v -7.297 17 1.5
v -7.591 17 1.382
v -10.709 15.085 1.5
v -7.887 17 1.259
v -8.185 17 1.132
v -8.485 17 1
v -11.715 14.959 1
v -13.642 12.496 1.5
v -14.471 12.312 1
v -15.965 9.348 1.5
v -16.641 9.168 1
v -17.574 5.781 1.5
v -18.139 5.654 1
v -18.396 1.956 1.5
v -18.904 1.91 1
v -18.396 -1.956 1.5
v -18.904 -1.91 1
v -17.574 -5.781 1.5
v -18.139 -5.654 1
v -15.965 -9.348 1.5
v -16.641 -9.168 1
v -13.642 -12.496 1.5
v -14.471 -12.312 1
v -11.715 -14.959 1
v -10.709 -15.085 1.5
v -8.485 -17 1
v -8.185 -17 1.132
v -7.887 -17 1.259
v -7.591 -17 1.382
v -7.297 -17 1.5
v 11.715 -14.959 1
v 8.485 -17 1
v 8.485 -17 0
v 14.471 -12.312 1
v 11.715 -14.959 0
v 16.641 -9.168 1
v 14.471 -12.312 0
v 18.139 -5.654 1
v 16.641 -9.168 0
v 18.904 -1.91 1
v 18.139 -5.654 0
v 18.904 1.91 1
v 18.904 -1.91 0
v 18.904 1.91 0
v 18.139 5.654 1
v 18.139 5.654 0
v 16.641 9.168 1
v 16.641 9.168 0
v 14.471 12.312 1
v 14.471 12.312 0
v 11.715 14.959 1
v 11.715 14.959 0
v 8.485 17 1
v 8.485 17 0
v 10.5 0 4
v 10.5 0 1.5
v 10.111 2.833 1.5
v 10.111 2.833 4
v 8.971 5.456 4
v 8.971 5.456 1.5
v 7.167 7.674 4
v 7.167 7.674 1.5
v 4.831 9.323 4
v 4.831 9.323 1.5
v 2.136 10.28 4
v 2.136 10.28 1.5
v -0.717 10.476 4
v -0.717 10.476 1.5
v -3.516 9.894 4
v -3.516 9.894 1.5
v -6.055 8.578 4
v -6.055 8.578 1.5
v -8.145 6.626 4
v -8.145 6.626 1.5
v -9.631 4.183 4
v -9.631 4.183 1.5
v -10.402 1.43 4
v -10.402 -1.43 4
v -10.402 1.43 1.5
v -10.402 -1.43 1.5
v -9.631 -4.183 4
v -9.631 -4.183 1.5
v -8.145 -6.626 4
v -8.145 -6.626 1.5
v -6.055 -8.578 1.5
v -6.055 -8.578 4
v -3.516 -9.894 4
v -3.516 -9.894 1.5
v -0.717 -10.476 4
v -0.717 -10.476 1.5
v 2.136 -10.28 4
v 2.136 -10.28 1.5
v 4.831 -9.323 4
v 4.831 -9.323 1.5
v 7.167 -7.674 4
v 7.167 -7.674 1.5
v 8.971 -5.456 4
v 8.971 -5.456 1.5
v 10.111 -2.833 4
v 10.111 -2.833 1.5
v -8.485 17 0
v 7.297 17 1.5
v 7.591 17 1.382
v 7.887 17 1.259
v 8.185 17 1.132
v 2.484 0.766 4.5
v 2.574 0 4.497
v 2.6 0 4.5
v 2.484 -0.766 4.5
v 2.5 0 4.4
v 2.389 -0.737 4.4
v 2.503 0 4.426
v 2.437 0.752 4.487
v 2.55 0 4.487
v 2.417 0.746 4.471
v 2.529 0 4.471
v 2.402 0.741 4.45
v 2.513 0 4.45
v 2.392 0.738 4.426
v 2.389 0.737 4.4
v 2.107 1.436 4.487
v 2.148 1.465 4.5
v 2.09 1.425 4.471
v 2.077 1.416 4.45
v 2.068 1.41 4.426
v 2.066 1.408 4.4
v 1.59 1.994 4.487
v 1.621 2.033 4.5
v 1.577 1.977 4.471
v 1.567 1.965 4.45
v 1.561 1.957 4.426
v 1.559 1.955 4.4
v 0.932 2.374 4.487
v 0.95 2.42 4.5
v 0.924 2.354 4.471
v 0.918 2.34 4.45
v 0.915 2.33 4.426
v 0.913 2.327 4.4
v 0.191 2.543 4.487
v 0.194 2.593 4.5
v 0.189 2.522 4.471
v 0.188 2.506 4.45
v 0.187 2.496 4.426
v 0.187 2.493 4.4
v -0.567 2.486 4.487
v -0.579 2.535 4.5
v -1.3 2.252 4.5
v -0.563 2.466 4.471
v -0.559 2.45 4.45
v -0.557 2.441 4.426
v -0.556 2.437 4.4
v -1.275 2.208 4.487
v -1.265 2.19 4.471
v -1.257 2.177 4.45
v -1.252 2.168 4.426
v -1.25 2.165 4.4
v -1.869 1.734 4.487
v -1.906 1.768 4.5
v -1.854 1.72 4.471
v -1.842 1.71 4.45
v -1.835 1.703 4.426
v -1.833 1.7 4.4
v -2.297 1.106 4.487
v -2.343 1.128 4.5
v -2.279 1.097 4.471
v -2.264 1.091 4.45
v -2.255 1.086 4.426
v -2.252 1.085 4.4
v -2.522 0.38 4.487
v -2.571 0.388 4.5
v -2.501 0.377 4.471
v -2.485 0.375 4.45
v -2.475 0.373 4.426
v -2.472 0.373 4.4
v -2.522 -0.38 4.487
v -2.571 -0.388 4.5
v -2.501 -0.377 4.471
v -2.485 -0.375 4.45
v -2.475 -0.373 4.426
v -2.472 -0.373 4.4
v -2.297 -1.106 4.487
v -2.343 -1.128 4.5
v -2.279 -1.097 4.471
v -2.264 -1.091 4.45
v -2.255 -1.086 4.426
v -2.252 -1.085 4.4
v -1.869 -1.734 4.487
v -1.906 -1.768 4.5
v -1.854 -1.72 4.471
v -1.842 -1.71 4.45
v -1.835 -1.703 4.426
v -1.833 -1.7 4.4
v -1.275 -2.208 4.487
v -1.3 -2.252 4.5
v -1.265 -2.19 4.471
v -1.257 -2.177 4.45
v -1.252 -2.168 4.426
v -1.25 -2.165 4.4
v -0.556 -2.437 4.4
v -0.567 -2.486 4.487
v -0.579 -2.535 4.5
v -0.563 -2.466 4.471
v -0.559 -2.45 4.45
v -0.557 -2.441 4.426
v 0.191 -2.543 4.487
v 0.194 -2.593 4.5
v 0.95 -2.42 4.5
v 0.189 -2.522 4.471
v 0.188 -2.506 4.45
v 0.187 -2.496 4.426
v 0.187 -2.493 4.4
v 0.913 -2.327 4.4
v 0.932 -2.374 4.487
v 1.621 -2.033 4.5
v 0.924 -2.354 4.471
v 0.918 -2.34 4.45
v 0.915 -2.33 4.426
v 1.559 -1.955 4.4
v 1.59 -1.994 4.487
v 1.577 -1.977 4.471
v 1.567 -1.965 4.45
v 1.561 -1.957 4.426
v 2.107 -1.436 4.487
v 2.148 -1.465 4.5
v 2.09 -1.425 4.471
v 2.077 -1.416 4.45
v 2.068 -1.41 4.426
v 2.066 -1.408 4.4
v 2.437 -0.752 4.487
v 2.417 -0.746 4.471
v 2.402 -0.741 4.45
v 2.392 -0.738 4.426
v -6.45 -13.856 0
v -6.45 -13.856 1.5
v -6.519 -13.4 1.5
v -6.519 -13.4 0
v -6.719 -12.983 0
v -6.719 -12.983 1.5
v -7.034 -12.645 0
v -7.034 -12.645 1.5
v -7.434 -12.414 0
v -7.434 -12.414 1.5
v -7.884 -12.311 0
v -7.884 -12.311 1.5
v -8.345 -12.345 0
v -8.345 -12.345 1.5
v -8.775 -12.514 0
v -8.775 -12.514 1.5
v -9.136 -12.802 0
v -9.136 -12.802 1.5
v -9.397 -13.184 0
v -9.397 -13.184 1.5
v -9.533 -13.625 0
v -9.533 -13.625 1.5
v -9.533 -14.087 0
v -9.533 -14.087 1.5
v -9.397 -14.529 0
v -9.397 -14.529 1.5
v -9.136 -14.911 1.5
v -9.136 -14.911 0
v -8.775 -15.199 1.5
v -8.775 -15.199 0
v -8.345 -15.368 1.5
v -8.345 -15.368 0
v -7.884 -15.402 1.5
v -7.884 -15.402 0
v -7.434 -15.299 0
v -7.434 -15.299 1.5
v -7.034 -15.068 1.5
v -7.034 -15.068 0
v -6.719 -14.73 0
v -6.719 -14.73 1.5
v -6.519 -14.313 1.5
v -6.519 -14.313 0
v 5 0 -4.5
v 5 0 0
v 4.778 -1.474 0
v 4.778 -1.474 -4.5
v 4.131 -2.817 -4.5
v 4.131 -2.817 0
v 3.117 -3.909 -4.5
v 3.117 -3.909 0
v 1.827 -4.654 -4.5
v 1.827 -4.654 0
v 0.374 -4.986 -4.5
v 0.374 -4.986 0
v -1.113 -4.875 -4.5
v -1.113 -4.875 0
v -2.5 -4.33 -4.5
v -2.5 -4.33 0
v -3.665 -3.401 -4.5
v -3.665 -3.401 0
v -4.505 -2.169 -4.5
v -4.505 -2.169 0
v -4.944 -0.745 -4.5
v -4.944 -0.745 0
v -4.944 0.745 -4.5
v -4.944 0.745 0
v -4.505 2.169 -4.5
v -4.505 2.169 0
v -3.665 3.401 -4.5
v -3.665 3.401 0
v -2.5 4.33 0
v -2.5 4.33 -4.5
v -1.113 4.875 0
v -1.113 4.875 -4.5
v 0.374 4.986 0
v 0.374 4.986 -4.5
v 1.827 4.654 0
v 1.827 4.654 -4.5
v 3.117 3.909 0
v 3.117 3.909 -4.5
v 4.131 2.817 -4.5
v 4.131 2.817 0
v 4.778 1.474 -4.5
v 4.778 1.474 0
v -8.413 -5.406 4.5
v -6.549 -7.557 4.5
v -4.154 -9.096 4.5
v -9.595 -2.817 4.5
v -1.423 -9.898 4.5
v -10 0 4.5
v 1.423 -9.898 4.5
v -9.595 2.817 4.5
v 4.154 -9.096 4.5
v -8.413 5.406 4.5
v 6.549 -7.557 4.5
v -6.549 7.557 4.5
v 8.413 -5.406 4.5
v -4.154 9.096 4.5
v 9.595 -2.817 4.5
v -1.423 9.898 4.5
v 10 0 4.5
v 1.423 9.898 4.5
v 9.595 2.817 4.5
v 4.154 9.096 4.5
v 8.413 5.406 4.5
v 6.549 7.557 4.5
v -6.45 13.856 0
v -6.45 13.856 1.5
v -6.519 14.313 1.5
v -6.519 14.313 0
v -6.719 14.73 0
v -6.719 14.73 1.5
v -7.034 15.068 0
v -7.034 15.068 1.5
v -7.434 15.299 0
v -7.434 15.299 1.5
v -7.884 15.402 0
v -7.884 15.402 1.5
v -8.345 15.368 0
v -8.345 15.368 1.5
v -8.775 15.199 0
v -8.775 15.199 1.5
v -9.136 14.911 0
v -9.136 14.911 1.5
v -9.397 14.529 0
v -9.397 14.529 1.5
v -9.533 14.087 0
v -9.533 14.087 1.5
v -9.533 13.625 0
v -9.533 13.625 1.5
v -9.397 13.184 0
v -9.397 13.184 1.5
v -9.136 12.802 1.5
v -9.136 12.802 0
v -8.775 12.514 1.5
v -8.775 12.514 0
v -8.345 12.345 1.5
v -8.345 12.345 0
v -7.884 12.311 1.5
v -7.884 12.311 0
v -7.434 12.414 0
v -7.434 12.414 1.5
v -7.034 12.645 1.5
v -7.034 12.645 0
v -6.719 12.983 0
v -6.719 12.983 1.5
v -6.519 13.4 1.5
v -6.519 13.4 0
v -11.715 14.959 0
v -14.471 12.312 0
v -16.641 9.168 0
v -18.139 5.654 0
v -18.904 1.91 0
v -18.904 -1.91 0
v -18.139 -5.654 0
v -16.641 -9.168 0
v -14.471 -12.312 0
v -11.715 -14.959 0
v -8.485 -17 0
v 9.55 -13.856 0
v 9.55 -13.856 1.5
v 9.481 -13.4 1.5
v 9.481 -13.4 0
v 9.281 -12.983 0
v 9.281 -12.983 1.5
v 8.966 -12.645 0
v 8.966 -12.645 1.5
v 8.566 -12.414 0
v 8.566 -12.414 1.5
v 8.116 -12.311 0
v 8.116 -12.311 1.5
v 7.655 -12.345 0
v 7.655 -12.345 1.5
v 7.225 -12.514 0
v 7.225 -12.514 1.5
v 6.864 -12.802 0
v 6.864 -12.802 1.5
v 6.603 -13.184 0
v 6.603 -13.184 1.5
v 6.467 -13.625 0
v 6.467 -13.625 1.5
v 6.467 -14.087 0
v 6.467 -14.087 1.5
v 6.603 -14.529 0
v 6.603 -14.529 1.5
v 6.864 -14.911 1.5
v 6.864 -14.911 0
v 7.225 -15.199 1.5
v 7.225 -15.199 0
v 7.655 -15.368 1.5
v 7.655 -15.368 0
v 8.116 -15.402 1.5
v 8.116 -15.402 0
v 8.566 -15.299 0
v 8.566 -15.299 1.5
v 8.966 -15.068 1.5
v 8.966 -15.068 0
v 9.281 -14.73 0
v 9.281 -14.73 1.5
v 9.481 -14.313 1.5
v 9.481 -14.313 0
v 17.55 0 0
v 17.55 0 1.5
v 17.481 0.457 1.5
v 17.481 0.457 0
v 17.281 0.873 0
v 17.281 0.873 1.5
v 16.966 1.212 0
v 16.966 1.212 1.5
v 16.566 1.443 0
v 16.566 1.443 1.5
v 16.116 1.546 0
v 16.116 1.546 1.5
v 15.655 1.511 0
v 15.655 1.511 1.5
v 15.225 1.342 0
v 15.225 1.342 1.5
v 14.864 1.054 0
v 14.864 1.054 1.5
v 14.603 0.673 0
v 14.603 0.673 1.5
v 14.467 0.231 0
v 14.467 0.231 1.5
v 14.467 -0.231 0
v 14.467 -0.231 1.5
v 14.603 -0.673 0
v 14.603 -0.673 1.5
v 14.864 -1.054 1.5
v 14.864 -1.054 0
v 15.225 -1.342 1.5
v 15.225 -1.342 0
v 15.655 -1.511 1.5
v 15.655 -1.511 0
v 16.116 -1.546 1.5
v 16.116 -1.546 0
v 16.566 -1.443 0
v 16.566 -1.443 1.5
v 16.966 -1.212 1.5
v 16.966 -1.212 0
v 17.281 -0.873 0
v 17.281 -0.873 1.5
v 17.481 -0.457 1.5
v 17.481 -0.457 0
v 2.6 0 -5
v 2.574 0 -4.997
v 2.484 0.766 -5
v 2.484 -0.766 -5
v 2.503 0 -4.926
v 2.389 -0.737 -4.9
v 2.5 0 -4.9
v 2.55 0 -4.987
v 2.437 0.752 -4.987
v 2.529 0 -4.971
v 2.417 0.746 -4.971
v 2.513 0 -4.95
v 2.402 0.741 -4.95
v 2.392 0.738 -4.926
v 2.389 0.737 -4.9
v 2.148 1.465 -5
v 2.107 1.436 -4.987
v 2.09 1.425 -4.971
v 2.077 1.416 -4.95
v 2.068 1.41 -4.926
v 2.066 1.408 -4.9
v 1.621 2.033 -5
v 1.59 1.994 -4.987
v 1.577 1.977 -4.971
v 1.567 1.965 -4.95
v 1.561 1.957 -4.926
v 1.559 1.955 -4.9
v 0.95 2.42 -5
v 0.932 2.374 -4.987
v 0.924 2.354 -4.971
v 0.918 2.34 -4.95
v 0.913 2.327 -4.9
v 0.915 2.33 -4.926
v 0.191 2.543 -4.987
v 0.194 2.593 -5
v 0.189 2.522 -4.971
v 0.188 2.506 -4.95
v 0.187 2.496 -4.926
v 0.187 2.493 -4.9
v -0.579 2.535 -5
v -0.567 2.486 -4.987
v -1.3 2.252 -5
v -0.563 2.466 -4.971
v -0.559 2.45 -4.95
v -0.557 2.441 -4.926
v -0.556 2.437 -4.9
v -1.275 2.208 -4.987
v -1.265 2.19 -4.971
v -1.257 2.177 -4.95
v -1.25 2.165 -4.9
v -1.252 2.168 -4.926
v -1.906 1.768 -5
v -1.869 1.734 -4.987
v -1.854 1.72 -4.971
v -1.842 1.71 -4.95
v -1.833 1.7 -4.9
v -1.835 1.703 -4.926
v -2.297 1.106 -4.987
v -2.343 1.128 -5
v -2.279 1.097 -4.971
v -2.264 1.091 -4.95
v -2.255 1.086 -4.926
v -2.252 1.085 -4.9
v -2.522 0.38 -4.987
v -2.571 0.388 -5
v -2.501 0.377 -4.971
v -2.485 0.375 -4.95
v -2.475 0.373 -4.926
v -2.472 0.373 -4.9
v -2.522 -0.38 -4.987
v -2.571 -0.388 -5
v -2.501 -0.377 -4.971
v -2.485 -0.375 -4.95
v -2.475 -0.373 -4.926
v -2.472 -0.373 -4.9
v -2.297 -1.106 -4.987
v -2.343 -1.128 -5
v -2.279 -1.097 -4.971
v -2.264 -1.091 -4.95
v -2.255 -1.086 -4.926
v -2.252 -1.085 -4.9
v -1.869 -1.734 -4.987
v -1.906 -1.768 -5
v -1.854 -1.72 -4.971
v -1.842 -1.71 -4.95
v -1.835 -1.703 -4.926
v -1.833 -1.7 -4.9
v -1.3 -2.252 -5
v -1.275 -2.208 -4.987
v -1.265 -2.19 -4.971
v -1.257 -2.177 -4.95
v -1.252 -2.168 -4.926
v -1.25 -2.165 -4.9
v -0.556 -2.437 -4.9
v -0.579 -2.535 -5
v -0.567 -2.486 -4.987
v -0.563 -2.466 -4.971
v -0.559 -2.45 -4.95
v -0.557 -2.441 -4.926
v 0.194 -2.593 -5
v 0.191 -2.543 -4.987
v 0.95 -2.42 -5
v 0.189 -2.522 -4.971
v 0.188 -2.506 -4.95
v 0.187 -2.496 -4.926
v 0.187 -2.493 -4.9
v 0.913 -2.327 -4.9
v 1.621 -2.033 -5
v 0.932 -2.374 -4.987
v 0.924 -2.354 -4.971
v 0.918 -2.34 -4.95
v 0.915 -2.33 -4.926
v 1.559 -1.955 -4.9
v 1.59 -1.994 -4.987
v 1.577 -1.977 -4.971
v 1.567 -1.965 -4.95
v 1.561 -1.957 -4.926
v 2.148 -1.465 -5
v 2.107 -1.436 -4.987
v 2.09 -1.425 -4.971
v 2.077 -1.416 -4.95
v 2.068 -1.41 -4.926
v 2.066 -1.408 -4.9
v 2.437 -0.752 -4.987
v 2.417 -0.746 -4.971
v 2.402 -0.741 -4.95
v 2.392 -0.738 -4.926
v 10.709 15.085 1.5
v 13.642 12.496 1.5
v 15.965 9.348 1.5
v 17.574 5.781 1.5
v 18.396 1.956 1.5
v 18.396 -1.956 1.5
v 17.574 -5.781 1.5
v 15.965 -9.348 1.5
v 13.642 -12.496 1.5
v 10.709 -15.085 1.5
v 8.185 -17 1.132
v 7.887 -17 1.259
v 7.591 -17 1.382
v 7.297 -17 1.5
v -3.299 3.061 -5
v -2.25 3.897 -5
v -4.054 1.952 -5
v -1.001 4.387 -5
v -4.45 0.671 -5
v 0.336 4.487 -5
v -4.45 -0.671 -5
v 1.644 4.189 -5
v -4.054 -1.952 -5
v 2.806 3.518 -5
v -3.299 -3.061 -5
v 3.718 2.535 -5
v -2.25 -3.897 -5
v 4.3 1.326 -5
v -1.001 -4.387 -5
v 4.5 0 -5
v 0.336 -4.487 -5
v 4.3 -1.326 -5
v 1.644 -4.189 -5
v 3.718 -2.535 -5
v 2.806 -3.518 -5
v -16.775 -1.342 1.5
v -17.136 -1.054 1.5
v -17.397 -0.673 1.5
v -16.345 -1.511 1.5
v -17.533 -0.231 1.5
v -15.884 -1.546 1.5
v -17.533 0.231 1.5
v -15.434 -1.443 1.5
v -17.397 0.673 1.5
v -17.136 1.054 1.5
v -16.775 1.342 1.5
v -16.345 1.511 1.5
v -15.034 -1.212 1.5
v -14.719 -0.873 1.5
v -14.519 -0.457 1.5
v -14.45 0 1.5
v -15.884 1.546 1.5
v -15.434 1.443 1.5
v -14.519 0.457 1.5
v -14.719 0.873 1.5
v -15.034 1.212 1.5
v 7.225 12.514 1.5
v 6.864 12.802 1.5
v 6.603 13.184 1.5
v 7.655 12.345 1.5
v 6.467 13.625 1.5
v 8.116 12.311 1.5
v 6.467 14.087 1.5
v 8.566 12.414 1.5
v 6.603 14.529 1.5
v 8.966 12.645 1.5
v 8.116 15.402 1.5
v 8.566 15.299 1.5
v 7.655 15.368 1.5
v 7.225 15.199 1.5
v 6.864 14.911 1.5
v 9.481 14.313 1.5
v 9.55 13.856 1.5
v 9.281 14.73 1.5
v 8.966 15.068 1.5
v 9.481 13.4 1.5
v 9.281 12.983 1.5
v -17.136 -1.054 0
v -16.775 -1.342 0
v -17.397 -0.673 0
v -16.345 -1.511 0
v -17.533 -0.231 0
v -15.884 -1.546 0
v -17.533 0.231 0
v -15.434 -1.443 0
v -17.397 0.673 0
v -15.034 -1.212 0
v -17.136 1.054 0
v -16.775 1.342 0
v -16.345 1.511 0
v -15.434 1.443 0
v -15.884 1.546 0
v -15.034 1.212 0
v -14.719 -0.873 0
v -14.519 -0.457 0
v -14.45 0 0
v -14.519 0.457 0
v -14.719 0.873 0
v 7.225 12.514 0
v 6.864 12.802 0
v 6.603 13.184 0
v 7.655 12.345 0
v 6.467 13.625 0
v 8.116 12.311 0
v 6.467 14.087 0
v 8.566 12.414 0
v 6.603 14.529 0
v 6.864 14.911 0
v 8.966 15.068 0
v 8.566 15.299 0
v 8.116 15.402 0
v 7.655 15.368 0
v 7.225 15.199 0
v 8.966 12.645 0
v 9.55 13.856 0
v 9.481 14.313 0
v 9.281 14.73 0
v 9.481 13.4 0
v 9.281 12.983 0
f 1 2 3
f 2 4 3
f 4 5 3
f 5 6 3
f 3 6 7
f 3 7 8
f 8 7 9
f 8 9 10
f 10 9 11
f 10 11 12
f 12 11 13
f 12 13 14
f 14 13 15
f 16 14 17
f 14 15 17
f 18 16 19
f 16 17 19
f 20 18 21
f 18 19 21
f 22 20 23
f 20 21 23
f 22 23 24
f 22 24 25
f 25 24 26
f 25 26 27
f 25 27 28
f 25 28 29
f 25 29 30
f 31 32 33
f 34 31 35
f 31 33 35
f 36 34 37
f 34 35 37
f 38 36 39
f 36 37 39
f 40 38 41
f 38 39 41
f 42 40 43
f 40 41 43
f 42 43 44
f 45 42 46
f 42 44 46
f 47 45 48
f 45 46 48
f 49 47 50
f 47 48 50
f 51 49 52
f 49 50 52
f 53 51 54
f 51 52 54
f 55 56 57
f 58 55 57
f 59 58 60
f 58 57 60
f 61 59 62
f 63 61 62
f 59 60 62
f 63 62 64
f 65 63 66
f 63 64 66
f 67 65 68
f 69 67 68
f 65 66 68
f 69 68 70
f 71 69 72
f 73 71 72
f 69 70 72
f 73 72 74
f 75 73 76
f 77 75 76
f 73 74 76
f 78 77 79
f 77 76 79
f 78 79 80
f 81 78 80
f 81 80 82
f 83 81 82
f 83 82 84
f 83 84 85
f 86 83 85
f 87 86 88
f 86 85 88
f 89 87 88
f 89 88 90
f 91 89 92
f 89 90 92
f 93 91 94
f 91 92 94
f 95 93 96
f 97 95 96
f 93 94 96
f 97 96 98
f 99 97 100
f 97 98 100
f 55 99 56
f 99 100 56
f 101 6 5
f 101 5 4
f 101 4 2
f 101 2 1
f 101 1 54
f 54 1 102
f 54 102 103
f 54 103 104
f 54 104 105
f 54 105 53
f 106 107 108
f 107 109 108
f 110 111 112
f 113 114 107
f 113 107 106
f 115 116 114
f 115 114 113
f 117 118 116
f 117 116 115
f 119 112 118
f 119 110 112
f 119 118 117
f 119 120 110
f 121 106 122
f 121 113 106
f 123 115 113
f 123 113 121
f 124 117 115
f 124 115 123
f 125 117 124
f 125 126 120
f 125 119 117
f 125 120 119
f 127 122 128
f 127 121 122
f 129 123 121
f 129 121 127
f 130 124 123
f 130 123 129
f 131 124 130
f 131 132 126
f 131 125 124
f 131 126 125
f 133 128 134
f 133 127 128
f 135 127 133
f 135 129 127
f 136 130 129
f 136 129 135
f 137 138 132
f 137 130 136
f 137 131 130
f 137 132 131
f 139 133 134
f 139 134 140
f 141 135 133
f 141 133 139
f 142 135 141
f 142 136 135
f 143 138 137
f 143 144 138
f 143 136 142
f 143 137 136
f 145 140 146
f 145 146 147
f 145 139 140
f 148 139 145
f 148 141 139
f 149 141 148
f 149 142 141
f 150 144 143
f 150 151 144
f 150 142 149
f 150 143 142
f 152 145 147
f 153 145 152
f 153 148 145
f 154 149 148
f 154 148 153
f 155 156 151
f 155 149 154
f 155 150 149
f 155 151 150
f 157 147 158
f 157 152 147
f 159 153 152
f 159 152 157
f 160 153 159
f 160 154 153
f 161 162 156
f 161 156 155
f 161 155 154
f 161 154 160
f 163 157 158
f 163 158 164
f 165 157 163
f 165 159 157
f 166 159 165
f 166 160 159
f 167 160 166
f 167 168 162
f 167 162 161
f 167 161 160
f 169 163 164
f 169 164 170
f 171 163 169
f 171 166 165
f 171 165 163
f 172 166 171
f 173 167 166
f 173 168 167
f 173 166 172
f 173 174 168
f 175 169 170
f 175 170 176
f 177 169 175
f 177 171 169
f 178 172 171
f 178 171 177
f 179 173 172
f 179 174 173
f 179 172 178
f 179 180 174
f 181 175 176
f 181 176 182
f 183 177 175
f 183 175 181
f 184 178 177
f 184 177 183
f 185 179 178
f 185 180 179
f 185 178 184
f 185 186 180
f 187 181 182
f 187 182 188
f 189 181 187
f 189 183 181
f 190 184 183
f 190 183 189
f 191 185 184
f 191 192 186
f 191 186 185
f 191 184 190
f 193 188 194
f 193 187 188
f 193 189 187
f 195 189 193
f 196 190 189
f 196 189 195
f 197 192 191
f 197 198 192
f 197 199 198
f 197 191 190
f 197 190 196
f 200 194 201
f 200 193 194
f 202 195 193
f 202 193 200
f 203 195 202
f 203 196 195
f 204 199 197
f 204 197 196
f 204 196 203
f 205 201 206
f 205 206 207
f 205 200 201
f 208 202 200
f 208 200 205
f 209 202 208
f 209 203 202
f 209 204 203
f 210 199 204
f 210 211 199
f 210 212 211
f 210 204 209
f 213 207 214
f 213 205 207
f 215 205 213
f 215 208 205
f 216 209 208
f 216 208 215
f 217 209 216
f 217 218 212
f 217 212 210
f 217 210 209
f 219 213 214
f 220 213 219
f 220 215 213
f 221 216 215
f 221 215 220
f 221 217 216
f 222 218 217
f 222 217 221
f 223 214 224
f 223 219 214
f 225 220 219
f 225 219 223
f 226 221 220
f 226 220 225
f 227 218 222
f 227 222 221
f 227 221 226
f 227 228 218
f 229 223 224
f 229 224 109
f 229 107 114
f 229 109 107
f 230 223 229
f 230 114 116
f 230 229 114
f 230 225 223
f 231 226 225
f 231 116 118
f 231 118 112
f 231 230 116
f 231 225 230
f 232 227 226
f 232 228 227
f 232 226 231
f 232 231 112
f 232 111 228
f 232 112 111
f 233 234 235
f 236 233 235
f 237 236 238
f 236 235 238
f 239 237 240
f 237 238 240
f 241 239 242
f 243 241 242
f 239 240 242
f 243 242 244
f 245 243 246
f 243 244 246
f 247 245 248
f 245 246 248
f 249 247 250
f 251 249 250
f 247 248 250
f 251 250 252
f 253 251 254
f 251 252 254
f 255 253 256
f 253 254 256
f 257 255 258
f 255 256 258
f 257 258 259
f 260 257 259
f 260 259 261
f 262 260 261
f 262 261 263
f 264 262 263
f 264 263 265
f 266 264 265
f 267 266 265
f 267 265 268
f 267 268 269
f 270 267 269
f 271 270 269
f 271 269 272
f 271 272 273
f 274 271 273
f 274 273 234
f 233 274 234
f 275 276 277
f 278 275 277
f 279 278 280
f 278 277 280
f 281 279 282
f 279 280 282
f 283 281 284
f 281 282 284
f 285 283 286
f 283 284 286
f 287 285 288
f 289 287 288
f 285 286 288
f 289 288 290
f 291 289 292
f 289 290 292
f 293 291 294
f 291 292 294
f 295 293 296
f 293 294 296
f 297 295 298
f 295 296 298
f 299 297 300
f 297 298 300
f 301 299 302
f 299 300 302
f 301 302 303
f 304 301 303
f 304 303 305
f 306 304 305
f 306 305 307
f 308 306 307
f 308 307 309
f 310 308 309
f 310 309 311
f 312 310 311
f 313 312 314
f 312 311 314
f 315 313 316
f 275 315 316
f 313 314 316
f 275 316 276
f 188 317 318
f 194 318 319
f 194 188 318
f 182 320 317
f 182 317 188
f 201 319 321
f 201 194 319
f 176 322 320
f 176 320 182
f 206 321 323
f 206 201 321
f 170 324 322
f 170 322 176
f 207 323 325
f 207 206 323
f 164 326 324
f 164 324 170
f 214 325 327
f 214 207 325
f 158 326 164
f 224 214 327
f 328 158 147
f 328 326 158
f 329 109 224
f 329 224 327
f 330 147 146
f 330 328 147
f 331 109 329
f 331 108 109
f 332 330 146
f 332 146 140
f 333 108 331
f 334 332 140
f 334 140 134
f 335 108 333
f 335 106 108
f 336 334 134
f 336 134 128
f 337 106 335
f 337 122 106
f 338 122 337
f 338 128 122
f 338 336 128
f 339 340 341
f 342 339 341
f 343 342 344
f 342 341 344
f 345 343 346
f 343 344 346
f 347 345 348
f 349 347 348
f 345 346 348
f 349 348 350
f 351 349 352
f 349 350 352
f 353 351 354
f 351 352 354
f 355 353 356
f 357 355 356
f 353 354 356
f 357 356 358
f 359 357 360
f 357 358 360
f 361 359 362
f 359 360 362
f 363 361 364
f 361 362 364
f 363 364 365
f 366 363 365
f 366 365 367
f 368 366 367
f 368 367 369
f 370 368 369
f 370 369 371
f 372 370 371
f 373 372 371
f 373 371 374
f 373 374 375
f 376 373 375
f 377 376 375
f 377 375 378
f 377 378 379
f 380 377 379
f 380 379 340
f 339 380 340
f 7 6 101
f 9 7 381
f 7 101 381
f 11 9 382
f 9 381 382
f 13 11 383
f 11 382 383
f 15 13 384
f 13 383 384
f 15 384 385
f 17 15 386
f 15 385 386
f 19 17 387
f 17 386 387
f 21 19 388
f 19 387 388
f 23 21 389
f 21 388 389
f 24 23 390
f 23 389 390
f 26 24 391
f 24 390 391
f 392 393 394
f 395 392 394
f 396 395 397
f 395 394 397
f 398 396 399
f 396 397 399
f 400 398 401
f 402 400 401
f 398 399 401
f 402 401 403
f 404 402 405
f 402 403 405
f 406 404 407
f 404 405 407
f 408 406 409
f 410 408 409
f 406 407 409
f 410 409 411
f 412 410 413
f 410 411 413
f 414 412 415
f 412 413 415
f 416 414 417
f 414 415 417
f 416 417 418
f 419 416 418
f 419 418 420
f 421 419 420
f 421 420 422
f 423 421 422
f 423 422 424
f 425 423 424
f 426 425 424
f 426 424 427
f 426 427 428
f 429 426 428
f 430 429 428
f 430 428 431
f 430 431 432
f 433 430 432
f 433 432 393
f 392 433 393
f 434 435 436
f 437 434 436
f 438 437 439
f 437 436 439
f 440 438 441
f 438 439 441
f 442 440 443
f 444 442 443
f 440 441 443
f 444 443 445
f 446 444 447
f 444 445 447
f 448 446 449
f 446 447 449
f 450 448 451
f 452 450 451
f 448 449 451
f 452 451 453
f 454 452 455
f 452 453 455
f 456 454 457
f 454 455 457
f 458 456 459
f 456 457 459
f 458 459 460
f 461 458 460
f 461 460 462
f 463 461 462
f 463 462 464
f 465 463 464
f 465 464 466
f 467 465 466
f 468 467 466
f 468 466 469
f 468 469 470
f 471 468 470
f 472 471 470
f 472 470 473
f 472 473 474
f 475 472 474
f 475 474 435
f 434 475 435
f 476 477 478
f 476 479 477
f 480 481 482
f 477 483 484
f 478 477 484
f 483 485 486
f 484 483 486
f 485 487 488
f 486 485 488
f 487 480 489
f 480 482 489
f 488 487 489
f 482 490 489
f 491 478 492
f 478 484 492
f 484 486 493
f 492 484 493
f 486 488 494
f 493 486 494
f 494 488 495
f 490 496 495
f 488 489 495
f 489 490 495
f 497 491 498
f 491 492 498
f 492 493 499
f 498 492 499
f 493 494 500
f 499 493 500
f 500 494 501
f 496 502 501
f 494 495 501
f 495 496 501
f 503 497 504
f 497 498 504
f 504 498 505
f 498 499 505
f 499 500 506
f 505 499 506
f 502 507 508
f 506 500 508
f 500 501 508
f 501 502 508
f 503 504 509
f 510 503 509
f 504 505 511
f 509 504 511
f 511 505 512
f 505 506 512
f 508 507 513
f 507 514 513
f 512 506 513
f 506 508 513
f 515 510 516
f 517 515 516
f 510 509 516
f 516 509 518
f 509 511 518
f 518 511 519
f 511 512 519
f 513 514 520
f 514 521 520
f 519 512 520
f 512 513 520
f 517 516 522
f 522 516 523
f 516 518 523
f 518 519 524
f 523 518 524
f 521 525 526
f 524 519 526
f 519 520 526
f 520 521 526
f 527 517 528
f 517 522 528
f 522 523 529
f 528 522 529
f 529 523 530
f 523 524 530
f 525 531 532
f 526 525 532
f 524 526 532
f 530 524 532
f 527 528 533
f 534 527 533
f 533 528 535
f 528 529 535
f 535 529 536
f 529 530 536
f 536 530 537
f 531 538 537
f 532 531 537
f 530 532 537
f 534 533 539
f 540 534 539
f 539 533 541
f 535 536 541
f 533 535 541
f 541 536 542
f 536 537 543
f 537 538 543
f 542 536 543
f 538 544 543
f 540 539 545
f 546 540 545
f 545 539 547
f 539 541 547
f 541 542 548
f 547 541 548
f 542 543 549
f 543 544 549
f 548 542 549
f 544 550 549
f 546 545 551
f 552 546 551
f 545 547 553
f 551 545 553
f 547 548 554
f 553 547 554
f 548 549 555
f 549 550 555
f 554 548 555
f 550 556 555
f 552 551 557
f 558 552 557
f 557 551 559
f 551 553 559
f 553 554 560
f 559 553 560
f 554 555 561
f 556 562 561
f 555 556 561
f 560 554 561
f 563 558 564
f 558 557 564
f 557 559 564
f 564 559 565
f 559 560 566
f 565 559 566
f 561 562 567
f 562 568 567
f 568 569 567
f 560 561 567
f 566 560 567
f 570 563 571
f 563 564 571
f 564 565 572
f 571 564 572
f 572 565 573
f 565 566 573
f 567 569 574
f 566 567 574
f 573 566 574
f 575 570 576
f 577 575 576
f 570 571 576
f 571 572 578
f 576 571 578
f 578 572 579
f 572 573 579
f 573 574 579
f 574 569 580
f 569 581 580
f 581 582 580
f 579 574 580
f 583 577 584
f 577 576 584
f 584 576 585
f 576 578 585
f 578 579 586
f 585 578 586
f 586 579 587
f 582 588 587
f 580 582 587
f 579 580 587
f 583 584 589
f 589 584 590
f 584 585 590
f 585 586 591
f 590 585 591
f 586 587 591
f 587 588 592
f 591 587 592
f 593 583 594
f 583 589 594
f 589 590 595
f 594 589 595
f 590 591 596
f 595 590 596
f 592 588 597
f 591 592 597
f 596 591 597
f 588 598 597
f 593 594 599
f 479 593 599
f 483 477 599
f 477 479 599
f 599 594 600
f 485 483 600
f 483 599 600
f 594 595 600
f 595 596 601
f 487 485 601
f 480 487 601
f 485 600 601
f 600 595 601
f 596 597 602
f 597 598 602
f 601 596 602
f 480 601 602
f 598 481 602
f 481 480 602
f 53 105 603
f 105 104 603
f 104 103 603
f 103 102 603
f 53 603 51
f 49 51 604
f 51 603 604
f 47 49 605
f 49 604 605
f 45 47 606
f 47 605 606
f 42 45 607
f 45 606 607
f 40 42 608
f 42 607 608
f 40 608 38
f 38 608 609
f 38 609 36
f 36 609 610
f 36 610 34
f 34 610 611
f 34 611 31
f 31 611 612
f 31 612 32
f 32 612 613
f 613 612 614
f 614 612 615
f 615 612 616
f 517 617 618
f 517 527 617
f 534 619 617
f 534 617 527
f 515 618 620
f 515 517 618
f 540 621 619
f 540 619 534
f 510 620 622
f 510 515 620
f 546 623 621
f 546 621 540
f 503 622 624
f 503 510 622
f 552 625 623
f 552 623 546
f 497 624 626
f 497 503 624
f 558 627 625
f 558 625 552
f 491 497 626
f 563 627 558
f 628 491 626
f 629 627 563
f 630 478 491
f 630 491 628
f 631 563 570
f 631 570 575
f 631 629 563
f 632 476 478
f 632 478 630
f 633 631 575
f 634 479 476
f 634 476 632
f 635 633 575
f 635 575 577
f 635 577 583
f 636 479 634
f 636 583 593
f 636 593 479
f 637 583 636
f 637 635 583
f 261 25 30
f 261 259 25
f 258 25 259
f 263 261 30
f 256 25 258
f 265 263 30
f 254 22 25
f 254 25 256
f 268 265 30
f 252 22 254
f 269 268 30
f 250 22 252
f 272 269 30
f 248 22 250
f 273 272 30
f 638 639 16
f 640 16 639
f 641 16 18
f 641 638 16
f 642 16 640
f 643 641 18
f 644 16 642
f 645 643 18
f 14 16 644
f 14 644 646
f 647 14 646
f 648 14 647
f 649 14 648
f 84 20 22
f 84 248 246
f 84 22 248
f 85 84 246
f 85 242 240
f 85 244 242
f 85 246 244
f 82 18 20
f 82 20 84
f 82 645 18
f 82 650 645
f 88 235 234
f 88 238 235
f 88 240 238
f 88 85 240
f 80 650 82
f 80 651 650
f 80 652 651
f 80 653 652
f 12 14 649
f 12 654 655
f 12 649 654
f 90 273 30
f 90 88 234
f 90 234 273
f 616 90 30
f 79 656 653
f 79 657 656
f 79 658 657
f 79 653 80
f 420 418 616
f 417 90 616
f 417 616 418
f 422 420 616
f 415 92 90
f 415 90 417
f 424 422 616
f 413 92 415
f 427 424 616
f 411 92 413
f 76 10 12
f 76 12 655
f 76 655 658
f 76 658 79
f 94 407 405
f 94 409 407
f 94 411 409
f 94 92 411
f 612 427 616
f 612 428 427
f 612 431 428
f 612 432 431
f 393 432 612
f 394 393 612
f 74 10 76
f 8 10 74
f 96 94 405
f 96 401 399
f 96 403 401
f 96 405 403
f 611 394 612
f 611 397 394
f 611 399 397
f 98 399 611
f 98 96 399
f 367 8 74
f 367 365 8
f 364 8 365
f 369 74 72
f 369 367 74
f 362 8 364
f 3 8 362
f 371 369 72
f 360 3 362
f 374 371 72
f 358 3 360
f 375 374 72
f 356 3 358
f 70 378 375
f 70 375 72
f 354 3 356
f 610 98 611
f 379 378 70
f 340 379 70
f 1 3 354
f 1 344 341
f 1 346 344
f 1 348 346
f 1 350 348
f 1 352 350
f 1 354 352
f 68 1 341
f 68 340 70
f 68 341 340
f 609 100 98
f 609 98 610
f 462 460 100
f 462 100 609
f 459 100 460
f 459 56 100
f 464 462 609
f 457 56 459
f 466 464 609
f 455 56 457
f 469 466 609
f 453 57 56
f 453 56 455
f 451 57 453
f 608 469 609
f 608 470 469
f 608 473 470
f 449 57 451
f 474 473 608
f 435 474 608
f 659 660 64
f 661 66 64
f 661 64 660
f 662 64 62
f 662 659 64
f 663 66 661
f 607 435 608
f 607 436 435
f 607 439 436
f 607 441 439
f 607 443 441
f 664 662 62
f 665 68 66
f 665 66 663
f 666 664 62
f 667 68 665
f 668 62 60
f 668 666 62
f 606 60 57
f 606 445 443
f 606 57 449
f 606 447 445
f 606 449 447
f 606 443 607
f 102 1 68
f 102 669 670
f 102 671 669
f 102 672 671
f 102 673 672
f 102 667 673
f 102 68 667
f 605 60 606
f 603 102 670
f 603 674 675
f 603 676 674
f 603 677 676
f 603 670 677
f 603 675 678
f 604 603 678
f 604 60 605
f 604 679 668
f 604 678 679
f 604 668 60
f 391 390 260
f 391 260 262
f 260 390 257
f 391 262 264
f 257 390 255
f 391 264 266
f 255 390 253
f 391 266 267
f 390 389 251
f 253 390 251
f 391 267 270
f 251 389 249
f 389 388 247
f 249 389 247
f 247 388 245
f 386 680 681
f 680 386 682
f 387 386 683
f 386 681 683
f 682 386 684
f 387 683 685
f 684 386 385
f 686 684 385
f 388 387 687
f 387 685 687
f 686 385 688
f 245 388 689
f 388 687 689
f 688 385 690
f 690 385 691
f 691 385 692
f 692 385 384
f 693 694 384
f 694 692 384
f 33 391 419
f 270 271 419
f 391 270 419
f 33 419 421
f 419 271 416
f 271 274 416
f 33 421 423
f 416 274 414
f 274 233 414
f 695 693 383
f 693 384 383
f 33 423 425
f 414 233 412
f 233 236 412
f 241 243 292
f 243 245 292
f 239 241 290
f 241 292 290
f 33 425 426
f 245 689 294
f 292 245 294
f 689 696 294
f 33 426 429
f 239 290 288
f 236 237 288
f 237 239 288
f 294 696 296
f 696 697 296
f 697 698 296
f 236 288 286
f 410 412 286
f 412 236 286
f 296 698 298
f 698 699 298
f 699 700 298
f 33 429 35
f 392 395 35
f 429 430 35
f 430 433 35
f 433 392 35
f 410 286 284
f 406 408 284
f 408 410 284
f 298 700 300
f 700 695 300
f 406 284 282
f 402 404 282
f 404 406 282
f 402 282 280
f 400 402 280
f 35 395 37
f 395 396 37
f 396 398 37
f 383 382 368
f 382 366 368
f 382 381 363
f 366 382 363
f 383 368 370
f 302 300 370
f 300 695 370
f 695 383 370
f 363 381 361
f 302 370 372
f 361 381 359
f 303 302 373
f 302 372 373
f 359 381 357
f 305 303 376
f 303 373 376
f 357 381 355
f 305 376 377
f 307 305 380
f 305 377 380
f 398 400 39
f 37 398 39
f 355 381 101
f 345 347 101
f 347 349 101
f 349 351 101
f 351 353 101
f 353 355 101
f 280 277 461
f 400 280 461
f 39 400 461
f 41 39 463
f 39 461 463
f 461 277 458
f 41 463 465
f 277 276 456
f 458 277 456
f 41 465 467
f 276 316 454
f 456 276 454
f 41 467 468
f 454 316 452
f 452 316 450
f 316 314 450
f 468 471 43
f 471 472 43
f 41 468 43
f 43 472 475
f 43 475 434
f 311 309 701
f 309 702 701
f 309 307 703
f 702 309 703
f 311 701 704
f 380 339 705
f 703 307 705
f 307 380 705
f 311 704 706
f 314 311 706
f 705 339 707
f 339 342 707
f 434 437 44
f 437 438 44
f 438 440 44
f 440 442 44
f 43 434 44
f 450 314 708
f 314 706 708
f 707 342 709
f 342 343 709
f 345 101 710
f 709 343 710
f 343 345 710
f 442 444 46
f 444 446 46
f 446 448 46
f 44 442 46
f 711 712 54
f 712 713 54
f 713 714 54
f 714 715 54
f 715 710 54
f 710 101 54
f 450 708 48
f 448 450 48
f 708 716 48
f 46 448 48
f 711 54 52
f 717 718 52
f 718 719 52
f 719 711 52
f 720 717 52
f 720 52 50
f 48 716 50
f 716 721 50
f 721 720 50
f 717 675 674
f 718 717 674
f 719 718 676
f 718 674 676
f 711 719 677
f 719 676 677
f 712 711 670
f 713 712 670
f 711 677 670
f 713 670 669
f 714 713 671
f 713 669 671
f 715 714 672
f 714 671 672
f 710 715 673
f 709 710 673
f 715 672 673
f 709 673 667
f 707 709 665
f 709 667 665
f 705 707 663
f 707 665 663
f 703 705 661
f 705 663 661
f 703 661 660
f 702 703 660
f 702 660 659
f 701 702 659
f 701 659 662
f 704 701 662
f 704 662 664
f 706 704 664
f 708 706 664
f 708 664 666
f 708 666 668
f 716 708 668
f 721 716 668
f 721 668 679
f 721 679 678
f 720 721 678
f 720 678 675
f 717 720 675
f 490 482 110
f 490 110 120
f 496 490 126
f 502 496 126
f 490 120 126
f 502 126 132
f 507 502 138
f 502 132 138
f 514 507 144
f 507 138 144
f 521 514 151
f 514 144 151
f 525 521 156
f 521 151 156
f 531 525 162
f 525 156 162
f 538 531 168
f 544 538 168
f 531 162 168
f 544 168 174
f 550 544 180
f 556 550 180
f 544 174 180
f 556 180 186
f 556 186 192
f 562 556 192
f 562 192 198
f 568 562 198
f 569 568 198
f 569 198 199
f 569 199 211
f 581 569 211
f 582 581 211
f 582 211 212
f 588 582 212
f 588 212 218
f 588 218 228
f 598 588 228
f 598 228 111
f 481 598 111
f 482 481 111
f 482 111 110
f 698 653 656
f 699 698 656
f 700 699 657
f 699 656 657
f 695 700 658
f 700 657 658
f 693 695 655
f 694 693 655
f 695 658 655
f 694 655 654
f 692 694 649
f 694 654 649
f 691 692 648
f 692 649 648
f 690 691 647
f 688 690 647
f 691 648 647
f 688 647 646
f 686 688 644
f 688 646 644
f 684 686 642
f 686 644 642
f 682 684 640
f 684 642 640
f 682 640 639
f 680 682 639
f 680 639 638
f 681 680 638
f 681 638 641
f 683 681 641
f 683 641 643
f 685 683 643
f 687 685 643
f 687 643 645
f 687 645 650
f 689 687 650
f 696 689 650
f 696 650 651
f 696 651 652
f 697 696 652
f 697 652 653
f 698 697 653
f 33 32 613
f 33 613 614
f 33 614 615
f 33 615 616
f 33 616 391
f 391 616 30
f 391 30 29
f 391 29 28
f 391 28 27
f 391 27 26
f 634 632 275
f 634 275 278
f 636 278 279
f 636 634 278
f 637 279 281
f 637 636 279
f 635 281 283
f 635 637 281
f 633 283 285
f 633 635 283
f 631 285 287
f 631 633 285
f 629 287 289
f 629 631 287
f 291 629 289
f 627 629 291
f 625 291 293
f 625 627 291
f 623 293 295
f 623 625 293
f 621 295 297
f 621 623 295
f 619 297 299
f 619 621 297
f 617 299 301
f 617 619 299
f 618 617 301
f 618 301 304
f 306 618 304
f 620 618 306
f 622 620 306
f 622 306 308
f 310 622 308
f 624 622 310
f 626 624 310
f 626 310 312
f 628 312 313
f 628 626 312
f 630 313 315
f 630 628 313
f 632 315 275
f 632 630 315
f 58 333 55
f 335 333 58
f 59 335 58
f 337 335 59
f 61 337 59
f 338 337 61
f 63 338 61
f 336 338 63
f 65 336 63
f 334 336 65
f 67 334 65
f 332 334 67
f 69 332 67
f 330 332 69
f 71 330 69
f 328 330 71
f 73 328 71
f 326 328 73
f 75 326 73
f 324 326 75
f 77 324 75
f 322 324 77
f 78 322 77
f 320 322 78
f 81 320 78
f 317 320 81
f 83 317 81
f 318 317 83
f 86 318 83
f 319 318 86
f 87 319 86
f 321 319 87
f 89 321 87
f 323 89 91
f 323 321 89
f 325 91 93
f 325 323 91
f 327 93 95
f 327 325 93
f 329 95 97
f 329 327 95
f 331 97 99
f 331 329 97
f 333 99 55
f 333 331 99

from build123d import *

# Parameters (mm, degrees)
SKETCH1_R           = 19
BOSS_EXTRUDE2_DEPTH = 1.5
SKETCH2_R           = 1.55
CUT_EXTRUDE1_DEPTH  = 6.5
SKETCH3_R           = 10.5
BOSS_EXTRUDE3_DEPTH = 3
SKETCH4_R           = 5
BOSS_EXTRUDE4_DEPTH = 5
SKETCH5_R           = 2.5
CUT_EXTRUDE2_DEPTH  = 28.207535721
CHAMFER1_SIZE       = 0.5
FILLET1_R           = 0.1


with BuildPart() as part:
    # Sketch1 → Boss-Extrude2 (new body)
    with BuildSketch(Plane.XY):
        Circle(SKETCH1_R)
    extrude(amount=BOSS_EXTRUDE2_DEPTH)

    # Sketch2 → Cut-Extrude1 (cut)
    with BuildSketch(Plane.XY.offset(1.5)):
        with BuildLine():
            ThreePointArc((8.485281374, 17), (0, 19), (-8.485281374, 17))
            Line((-8.485281374, 17), (8.485281374, 17))
        make_face()
        with BuildLine():
            Line((8.485281374, -17), (-8.485281374, -17))
            ThreePointArc((-8.485281374, -17), (0, -19), (8.485281374, -17))
        make_face()
        with Locations((-8, 13.856406461)):
            Circle(SKETCH2_R)
        with Locations((8, 13.856406461)):
            Circle(SKETCH2_R)
        with Locations((16, 0)):
            Circle(SKETCH2_R)
        with Locations((8, -13.856406461)):
            Circle(SKETCH2_R)
        with Locations((-8, -13.856406461)):
            Circle(SKETCH2_R)
        with Locations((-16, 0)):
            Circle(SKETCH2_R)
    extrude(amount=-CUT_EXTRUDE1_DEPTH, mode=Mode.SUBTRACT)

    # Sketch3 → Boss-Extrude3 (add)
    with BuildSketch(Plane.XY.offset(1.5)):
        Circle(SKETCH3_R)
    extrude(amount=BOSS_EXTRUDE3_DEPTH)

    # Sketch4 → Boss-Extrude4 (add)
    with BuildSketch(Plane(origin=(0, 0, 0), x_dir=(-1, 0, 0), z_dir=(0, 0, -1))):
        with Locations(Location((0, 0, 0), (0, 0, 180))):
            Circle(SKETCH4_R)
    extrude(amount=BOSS_EXTRUDE4_DEPTH)

    # Sketch5 → Cut-Extrude2 (cut, through all)
    with BuildSketch(Plane.XY.offset(4.5)):
        Circle(SKETCH5_R)
    extrude(amount=-CUT_EXTRUDE2_DEPTH, mode=Mode.SUBTRACT)

    # Chamfer1
    chamfer1_edges = [part.edges().sort_by_distance(p)[0] for p in [
        (-19, 0, 1.5),
        (19, 0, 1.5),
        (-10.5, 0, 4.5),
        (-5, 0, -5),
    ]]
    chamfer(chamfer1_edges, length=CHAMFER1_SIZE)

    # Fillet1
    fillet1_edges = [part.edges().sort_by_distance(p)[0] for p in [
        (-2.5, 0, -5),
        (-2.5, 0, 4.5),
    ]]
    fillet(fillet1_edges, radius=FILLET1_R)


solid = part.part
